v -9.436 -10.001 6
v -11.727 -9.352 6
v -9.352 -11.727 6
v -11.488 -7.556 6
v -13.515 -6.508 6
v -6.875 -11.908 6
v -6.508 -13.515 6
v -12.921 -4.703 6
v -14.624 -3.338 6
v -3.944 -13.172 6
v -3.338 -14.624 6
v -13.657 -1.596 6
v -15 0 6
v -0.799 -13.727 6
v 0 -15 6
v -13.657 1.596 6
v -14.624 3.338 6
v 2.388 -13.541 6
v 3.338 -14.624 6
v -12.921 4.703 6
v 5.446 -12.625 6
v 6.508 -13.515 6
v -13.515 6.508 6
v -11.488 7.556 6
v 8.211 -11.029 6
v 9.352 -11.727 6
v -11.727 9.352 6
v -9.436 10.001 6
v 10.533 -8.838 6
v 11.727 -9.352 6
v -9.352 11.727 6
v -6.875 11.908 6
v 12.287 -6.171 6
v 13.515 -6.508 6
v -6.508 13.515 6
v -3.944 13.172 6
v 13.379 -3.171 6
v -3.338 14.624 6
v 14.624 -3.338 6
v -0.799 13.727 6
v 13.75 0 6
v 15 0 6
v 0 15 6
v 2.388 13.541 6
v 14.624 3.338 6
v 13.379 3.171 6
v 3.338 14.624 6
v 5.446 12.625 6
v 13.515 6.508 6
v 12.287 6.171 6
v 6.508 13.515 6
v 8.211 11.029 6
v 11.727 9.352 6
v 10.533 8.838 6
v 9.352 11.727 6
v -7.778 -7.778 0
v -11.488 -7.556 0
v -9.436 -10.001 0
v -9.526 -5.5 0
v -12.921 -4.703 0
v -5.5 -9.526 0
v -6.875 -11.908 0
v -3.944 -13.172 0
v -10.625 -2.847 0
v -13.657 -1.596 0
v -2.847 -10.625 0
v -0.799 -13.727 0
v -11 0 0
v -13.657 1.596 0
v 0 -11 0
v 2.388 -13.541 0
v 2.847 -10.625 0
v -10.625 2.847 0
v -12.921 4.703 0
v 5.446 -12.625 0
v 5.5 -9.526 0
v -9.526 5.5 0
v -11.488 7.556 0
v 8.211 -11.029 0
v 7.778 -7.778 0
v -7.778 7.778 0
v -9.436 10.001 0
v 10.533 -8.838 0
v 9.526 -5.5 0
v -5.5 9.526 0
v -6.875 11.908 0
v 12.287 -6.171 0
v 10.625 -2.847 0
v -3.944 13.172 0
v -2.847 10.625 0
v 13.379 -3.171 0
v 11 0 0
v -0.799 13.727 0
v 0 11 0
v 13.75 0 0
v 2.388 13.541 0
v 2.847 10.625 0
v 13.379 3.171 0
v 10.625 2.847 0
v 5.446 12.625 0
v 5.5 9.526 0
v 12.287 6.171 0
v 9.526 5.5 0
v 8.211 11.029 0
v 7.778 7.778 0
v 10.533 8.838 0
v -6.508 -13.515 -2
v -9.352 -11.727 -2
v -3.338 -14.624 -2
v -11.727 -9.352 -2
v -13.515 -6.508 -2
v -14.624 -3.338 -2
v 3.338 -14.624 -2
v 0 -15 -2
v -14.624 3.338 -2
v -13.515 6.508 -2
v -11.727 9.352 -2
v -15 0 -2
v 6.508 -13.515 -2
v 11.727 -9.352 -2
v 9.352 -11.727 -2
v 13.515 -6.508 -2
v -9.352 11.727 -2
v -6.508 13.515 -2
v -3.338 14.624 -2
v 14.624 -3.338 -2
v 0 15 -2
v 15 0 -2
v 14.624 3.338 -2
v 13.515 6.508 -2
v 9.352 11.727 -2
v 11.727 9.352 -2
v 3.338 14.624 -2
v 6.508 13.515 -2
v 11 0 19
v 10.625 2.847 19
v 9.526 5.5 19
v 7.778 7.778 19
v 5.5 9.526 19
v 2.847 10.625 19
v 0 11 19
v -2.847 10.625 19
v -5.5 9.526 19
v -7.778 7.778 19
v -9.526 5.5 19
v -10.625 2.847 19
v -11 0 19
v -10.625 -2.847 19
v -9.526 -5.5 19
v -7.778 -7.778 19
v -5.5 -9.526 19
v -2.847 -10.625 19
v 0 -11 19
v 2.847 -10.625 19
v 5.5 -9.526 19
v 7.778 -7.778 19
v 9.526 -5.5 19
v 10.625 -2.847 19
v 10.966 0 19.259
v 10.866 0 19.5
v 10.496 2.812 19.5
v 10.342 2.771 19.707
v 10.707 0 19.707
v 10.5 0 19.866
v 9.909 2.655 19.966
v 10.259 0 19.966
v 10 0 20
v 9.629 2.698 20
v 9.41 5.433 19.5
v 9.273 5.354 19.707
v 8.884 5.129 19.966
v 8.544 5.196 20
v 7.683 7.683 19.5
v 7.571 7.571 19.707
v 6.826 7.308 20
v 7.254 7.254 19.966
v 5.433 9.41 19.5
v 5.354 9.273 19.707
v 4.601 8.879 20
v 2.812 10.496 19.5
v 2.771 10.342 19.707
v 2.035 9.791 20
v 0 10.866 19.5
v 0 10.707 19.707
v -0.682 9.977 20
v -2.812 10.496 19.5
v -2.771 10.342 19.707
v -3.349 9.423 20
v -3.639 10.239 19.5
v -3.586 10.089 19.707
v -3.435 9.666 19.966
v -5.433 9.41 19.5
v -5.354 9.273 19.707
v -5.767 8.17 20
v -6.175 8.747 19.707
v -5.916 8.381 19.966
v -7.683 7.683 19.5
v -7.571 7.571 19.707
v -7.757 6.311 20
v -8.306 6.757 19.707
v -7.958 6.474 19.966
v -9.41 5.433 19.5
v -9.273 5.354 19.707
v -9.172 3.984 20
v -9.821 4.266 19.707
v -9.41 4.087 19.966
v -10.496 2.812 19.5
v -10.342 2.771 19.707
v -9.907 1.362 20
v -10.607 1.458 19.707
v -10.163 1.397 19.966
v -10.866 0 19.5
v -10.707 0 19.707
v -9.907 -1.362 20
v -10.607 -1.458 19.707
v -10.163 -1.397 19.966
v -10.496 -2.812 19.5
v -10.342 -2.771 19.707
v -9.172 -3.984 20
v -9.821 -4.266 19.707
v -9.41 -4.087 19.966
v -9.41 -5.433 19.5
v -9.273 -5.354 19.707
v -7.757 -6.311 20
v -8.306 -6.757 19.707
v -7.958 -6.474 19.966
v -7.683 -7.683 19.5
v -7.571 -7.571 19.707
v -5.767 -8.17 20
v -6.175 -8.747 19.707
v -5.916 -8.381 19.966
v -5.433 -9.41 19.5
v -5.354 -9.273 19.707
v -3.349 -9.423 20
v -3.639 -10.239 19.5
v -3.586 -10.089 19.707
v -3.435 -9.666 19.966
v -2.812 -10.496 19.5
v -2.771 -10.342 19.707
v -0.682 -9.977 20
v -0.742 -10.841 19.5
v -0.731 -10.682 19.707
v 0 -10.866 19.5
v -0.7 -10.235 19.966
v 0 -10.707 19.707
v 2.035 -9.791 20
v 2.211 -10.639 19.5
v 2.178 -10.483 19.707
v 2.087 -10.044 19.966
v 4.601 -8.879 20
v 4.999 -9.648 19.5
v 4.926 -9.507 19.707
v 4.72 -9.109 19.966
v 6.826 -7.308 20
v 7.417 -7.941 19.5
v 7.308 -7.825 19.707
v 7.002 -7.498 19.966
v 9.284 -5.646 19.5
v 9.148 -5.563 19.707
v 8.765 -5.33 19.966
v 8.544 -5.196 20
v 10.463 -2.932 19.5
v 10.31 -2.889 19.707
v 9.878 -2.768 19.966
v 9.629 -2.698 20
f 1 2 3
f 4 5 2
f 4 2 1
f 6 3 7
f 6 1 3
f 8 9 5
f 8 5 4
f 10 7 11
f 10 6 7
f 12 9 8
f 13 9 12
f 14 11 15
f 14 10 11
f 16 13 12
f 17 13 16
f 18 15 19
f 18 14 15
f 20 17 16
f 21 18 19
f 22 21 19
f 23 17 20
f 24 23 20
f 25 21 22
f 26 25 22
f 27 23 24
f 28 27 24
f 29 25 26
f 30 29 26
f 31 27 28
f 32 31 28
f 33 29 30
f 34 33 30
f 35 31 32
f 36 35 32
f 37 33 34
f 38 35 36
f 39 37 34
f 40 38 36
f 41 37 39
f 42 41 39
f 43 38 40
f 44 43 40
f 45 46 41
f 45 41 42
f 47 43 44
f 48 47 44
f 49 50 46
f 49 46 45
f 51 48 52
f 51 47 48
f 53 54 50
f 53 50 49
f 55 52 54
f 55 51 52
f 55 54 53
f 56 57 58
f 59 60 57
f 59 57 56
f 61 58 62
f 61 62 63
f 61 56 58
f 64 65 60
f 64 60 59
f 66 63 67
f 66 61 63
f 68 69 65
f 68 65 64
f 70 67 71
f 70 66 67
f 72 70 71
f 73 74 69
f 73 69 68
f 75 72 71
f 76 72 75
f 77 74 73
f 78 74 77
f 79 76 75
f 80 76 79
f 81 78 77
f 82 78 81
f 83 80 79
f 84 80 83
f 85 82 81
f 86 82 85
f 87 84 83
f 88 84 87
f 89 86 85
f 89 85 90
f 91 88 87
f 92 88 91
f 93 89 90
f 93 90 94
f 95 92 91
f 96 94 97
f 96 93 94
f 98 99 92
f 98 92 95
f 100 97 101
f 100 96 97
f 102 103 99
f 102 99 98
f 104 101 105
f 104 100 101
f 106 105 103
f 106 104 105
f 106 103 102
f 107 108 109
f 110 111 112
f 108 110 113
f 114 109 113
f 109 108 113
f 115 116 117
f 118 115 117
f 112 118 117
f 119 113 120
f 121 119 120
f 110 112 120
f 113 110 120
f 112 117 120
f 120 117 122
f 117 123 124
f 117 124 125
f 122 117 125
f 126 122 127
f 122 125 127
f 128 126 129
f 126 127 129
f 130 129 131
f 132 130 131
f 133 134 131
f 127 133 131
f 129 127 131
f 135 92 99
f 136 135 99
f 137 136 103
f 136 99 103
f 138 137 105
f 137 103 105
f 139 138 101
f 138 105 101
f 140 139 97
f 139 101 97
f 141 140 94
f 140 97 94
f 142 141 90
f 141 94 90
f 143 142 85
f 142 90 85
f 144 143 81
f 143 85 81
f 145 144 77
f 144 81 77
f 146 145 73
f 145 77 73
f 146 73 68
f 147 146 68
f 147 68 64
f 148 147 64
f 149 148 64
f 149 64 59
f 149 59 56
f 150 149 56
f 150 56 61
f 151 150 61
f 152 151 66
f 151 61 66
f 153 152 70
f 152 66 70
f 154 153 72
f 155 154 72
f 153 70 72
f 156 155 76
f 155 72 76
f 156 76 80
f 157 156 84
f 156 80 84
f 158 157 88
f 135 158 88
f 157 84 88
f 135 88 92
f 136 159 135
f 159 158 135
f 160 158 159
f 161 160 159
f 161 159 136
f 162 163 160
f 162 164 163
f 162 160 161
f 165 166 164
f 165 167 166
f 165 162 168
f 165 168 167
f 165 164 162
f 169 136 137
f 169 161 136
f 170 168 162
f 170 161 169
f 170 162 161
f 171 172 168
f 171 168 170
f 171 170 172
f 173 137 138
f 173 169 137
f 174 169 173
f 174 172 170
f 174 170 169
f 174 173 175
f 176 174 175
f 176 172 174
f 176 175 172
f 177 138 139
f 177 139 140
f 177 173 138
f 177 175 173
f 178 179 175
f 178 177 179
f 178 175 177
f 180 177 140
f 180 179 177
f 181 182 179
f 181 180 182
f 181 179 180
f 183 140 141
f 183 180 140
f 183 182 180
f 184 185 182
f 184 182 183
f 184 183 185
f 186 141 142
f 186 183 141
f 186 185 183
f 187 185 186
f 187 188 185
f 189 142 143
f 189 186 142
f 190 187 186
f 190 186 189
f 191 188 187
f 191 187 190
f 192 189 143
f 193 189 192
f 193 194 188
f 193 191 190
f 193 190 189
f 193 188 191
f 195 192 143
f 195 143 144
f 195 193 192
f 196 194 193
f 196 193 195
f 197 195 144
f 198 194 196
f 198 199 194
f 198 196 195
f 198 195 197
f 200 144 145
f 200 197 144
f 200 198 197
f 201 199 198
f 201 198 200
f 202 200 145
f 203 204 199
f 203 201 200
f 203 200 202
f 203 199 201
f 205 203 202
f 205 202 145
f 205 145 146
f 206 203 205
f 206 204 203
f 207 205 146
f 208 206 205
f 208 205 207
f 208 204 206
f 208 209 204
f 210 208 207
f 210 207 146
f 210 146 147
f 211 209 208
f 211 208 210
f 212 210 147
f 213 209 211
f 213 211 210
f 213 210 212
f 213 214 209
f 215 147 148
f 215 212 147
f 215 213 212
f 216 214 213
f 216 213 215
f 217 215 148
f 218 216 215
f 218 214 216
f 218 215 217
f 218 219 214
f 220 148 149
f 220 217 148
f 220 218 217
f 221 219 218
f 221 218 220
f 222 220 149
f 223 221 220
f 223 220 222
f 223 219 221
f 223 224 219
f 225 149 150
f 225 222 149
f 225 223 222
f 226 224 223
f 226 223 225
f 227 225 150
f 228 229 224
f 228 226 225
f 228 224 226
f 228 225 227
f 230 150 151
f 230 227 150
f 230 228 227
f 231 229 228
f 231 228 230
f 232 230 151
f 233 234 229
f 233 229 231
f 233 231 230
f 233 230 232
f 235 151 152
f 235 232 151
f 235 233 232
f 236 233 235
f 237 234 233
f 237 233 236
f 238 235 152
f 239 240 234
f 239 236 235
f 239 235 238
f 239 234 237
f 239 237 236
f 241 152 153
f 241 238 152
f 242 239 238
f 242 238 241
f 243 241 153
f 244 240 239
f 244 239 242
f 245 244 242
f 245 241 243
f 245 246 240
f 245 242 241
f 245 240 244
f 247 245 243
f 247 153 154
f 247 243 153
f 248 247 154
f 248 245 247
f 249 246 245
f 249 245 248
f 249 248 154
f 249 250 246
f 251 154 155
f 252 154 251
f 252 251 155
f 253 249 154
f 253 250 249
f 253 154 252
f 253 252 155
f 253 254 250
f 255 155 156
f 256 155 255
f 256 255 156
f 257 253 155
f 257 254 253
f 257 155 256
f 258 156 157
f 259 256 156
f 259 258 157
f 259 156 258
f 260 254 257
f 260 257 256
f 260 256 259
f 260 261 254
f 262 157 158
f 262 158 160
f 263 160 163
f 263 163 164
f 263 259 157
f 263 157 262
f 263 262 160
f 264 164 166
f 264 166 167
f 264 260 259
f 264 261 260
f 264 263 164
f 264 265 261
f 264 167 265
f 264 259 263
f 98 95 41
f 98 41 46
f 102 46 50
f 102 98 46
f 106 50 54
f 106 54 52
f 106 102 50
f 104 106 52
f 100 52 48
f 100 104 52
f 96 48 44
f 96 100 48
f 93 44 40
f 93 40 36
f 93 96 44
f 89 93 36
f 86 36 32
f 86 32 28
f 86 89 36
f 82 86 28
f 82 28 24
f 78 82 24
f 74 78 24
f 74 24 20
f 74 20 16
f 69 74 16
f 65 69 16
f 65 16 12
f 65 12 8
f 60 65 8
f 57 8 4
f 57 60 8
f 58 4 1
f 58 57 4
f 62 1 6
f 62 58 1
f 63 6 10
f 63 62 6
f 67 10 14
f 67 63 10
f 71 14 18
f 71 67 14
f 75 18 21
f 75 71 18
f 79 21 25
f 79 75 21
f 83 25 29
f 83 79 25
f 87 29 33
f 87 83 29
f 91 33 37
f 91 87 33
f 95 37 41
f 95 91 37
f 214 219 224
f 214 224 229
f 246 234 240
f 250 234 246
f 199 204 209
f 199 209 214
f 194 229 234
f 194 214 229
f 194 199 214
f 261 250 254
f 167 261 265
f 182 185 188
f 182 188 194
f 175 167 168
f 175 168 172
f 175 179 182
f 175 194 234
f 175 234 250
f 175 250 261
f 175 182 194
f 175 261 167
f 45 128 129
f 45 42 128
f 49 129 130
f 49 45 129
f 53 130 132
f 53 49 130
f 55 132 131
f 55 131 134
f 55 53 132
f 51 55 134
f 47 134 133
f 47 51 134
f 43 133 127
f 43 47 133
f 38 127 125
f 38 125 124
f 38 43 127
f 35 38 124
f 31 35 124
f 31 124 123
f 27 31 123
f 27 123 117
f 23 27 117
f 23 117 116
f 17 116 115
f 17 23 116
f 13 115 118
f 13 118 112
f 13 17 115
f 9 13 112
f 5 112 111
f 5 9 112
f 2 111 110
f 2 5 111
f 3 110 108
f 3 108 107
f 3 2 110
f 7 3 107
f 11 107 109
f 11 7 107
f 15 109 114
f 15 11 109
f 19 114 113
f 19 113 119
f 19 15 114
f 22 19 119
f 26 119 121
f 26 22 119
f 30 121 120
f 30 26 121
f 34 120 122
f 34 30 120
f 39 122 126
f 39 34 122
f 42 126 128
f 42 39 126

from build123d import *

# Parameters (mm, degrees)
F0_R     = 15
F0_R_2   = 13.75
F1_DEPTH = 6
F0_R_3   = 11
F2_DEPTH = 2
F3_DEPTH = 20
F4_R     = 1


with BuildPart() as f1:
    # F0 (on Top) → F1 (new body)
    with BuildSketch(Plane.XY):
        Circle(F0_R)
        Circle(F0_R_2, mode=Mode.SUBTRACT)
    extrude(amount=F1_DEPTH)

    # F0 (on Top) → F2 (join)
    with BuildSketch(Plane.XY):
        Circle(F0_R)
        Circle(F0_R_2, mode=Mode.SUBTRACT)
        Circle(F0_R_2)
        Circle(F0_R_3, mode=Mode.SUBTRACT)
        Circle(F0_R_3)
    extrude(amount=-F2_DEPTH)

    # F0 (on Top) → F3 (join)
    with BuildSketch(Plane.XY):
        Circle(F0_R_3)
    extrude(amount=F3_DEPTH)

    # F4
    f4_edges = [f1.edges().sort_by_distance(p)[0] for p in [
        (-11, 0, 20),
    ]]
    fillet(f4_edges, radius=F4_R)


solid = f1.part
